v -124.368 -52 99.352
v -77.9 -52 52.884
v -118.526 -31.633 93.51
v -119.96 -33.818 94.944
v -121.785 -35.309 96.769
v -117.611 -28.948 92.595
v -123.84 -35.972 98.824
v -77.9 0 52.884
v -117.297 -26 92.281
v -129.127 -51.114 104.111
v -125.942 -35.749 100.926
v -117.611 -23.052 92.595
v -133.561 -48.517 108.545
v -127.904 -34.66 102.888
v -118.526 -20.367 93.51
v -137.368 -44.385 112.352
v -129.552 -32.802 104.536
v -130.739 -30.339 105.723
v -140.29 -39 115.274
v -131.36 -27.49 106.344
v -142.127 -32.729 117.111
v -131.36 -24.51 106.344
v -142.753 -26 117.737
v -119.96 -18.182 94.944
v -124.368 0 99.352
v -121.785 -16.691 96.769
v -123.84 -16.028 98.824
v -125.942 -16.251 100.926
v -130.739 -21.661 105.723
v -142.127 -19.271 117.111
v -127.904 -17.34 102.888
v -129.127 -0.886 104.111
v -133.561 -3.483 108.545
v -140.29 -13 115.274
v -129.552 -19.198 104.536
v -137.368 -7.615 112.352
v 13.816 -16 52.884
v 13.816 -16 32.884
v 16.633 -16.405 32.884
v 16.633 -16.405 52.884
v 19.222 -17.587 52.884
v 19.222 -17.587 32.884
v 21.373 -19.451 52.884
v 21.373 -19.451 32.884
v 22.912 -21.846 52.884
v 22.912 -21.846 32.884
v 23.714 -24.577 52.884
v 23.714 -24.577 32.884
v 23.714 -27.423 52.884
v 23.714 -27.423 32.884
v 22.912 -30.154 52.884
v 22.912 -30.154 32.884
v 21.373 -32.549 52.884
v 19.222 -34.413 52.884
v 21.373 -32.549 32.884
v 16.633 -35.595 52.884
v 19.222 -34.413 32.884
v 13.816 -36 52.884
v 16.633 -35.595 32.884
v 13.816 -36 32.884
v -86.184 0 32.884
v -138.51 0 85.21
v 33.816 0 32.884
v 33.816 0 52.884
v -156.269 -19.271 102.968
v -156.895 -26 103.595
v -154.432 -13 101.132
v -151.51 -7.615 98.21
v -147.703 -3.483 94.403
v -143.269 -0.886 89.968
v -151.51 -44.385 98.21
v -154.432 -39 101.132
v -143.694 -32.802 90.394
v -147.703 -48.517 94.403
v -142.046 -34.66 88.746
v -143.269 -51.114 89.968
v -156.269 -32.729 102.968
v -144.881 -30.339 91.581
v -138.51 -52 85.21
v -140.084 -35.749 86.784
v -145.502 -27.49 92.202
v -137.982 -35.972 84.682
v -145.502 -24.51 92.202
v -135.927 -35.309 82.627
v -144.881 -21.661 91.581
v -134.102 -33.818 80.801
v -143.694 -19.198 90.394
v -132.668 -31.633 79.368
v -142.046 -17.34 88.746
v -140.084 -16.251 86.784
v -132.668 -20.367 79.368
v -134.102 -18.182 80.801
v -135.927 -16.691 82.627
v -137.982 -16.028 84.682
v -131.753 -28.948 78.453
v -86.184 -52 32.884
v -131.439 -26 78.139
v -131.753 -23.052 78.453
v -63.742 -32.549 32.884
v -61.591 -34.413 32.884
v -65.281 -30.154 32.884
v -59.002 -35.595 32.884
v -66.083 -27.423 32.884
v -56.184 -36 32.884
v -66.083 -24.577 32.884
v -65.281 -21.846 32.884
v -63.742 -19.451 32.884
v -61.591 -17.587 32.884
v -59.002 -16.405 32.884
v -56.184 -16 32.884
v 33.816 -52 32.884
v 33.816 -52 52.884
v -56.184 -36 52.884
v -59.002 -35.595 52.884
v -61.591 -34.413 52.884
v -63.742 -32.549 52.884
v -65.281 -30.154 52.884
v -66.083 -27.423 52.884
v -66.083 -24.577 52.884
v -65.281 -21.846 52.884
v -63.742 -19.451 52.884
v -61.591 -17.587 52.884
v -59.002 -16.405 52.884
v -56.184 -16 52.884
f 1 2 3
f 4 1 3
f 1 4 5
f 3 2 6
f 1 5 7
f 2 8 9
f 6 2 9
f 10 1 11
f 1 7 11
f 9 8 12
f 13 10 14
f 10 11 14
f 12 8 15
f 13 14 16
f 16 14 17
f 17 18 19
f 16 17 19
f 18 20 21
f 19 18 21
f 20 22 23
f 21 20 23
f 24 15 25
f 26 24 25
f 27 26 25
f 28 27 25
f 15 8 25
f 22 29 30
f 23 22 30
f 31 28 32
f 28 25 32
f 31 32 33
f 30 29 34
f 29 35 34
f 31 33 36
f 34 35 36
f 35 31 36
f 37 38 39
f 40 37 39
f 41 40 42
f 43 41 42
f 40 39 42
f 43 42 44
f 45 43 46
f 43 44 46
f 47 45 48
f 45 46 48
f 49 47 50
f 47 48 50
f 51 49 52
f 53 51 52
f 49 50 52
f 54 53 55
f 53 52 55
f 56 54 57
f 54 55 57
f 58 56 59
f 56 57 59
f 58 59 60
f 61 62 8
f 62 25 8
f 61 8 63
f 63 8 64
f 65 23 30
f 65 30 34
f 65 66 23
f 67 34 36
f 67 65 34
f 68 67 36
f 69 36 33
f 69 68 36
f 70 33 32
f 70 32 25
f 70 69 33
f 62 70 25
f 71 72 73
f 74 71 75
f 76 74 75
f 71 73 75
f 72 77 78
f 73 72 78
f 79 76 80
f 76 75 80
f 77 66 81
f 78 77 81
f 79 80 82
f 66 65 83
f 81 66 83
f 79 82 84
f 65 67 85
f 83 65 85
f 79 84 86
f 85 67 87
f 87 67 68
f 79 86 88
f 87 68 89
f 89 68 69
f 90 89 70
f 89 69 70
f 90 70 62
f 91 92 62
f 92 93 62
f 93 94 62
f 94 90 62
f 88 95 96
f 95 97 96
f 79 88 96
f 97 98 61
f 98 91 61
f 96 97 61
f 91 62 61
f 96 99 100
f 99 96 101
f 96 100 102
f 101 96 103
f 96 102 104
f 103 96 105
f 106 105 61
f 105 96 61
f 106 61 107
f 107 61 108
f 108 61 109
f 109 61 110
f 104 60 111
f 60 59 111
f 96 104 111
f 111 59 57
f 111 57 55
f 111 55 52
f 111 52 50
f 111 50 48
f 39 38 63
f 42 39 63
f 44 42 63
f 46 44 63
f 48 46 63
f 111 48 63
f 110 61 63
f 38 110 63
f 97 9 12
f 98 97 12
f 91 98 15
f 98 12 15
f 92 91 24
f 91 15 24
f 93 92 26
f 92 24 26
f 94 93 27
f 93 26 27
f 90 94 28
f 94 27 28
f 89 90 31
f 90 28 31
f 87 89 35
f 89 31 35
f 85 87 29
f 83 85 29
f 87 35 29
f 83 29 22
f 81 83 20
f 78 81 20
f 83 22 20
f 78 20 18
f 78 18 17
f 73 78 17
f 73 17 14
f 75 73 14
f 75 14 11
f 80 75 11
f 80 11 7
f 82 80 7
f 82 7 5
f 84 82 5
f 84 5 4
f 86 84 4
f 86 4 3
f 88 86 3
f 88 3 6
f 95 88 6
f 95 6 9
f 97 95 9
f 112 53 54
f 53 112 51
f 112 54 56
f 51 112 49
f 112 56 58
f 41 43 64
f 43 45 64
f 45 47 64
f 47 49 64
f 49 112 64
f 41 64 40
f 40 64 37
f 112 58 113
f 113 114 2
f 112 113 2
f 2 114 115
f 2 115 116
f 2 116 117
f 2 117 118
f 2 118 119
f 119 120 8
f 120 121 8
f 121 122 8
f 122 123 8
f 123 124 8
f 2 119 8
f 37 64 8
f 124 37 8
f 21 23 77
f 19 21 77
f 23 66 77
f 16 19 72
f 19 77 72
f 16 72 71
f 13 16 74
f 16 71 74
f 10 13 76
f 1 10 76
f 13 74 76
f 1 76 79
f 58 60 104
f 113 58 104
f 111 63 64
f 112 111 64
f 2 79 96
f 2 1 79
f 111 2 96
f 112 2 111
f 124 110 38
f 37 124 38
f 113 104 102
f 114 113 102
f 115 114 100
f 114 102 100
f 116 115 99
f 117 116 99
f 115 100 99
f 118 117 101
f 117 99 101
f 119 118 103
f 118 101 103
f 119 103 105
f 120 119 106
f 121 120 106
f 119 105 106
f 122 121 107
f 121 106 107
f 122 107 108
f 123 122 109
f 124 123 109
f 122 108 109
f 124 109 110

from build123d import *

# Parameters (mm, degrees)
F1_DEPTH = 52
F2_R     = 25.99999
F4_DEPTH = 26
F5_R     = 10
F6_DEPTH = 25


# Not quite as in the source:
# - a fillet or chamfer is up to 0.001 mm smaller than in the source, because OpenCascade refuses the exact size


with BuildPart() as f1:
    # F0 (on Front) → F1 (new body)
    with BuildSketch(Plane.XZ):
        Polygon((-156.8951708629, 103.594939314), (-86.1844927443, 32.8842611954), (33.8155072557, 32.8842611954), (33.8155072557, 52.8842611954), (-77.9002214968, 52.8842611954), (-142.7530352392, 117.7370749377), align=None)
    extrude(amount=F1_DEPTH)

    # F2 (radius 26 in the source; OpenCascade refuses exactly that, so slightly less here)
    f2_edges = [f1.edges().sort_by_distance(p)[0] for p in [
        (-149.824103, -52, 110.666007),
        (-149.824103, 0, 110.666007),
    ]]
    fillet(f2_edges, radius=F2_R)

    # F3 (on face) → F4 (cut)
    with BuildSketch(Plane(origin=(0, 0, 32.8842611954), x_dir=(1, 0, 0), z_dir=(0, 0, -1))):
        with BuildLine():
            ThreePointArc((-56.184492662, 36), (-66.1844927443, 26), (-56.184492662, 16))
            Line((-56.184492662, 16), (13.8155072557, 16))
            ThreePointArc((13.8155072557, 16), (23.8155072557, 26), (13.8155072557, 36))
            Line((13.8155072557, 36), (-56.184492662, 36))
        make_face()
    extrude(amount=-F4_DEPTH, mode=Mode.SUBTRACT)

    # F5 (on face) → F6 (cut)
    with BuildSketch(Plane(origin=(-12.5079801507, 0, -12.5079801507), x_dir=(0.7071067812, 0, -0.7071067812), z_dir=(0.7071067812, 0, 0.7071067812))):
        with Locations((-158.1943233382, -26)):
            Circle(F5_R)
    extrude(amount=-F6_DEPTH, mode=Mode.SUBTRACT)


solid = f1.part
